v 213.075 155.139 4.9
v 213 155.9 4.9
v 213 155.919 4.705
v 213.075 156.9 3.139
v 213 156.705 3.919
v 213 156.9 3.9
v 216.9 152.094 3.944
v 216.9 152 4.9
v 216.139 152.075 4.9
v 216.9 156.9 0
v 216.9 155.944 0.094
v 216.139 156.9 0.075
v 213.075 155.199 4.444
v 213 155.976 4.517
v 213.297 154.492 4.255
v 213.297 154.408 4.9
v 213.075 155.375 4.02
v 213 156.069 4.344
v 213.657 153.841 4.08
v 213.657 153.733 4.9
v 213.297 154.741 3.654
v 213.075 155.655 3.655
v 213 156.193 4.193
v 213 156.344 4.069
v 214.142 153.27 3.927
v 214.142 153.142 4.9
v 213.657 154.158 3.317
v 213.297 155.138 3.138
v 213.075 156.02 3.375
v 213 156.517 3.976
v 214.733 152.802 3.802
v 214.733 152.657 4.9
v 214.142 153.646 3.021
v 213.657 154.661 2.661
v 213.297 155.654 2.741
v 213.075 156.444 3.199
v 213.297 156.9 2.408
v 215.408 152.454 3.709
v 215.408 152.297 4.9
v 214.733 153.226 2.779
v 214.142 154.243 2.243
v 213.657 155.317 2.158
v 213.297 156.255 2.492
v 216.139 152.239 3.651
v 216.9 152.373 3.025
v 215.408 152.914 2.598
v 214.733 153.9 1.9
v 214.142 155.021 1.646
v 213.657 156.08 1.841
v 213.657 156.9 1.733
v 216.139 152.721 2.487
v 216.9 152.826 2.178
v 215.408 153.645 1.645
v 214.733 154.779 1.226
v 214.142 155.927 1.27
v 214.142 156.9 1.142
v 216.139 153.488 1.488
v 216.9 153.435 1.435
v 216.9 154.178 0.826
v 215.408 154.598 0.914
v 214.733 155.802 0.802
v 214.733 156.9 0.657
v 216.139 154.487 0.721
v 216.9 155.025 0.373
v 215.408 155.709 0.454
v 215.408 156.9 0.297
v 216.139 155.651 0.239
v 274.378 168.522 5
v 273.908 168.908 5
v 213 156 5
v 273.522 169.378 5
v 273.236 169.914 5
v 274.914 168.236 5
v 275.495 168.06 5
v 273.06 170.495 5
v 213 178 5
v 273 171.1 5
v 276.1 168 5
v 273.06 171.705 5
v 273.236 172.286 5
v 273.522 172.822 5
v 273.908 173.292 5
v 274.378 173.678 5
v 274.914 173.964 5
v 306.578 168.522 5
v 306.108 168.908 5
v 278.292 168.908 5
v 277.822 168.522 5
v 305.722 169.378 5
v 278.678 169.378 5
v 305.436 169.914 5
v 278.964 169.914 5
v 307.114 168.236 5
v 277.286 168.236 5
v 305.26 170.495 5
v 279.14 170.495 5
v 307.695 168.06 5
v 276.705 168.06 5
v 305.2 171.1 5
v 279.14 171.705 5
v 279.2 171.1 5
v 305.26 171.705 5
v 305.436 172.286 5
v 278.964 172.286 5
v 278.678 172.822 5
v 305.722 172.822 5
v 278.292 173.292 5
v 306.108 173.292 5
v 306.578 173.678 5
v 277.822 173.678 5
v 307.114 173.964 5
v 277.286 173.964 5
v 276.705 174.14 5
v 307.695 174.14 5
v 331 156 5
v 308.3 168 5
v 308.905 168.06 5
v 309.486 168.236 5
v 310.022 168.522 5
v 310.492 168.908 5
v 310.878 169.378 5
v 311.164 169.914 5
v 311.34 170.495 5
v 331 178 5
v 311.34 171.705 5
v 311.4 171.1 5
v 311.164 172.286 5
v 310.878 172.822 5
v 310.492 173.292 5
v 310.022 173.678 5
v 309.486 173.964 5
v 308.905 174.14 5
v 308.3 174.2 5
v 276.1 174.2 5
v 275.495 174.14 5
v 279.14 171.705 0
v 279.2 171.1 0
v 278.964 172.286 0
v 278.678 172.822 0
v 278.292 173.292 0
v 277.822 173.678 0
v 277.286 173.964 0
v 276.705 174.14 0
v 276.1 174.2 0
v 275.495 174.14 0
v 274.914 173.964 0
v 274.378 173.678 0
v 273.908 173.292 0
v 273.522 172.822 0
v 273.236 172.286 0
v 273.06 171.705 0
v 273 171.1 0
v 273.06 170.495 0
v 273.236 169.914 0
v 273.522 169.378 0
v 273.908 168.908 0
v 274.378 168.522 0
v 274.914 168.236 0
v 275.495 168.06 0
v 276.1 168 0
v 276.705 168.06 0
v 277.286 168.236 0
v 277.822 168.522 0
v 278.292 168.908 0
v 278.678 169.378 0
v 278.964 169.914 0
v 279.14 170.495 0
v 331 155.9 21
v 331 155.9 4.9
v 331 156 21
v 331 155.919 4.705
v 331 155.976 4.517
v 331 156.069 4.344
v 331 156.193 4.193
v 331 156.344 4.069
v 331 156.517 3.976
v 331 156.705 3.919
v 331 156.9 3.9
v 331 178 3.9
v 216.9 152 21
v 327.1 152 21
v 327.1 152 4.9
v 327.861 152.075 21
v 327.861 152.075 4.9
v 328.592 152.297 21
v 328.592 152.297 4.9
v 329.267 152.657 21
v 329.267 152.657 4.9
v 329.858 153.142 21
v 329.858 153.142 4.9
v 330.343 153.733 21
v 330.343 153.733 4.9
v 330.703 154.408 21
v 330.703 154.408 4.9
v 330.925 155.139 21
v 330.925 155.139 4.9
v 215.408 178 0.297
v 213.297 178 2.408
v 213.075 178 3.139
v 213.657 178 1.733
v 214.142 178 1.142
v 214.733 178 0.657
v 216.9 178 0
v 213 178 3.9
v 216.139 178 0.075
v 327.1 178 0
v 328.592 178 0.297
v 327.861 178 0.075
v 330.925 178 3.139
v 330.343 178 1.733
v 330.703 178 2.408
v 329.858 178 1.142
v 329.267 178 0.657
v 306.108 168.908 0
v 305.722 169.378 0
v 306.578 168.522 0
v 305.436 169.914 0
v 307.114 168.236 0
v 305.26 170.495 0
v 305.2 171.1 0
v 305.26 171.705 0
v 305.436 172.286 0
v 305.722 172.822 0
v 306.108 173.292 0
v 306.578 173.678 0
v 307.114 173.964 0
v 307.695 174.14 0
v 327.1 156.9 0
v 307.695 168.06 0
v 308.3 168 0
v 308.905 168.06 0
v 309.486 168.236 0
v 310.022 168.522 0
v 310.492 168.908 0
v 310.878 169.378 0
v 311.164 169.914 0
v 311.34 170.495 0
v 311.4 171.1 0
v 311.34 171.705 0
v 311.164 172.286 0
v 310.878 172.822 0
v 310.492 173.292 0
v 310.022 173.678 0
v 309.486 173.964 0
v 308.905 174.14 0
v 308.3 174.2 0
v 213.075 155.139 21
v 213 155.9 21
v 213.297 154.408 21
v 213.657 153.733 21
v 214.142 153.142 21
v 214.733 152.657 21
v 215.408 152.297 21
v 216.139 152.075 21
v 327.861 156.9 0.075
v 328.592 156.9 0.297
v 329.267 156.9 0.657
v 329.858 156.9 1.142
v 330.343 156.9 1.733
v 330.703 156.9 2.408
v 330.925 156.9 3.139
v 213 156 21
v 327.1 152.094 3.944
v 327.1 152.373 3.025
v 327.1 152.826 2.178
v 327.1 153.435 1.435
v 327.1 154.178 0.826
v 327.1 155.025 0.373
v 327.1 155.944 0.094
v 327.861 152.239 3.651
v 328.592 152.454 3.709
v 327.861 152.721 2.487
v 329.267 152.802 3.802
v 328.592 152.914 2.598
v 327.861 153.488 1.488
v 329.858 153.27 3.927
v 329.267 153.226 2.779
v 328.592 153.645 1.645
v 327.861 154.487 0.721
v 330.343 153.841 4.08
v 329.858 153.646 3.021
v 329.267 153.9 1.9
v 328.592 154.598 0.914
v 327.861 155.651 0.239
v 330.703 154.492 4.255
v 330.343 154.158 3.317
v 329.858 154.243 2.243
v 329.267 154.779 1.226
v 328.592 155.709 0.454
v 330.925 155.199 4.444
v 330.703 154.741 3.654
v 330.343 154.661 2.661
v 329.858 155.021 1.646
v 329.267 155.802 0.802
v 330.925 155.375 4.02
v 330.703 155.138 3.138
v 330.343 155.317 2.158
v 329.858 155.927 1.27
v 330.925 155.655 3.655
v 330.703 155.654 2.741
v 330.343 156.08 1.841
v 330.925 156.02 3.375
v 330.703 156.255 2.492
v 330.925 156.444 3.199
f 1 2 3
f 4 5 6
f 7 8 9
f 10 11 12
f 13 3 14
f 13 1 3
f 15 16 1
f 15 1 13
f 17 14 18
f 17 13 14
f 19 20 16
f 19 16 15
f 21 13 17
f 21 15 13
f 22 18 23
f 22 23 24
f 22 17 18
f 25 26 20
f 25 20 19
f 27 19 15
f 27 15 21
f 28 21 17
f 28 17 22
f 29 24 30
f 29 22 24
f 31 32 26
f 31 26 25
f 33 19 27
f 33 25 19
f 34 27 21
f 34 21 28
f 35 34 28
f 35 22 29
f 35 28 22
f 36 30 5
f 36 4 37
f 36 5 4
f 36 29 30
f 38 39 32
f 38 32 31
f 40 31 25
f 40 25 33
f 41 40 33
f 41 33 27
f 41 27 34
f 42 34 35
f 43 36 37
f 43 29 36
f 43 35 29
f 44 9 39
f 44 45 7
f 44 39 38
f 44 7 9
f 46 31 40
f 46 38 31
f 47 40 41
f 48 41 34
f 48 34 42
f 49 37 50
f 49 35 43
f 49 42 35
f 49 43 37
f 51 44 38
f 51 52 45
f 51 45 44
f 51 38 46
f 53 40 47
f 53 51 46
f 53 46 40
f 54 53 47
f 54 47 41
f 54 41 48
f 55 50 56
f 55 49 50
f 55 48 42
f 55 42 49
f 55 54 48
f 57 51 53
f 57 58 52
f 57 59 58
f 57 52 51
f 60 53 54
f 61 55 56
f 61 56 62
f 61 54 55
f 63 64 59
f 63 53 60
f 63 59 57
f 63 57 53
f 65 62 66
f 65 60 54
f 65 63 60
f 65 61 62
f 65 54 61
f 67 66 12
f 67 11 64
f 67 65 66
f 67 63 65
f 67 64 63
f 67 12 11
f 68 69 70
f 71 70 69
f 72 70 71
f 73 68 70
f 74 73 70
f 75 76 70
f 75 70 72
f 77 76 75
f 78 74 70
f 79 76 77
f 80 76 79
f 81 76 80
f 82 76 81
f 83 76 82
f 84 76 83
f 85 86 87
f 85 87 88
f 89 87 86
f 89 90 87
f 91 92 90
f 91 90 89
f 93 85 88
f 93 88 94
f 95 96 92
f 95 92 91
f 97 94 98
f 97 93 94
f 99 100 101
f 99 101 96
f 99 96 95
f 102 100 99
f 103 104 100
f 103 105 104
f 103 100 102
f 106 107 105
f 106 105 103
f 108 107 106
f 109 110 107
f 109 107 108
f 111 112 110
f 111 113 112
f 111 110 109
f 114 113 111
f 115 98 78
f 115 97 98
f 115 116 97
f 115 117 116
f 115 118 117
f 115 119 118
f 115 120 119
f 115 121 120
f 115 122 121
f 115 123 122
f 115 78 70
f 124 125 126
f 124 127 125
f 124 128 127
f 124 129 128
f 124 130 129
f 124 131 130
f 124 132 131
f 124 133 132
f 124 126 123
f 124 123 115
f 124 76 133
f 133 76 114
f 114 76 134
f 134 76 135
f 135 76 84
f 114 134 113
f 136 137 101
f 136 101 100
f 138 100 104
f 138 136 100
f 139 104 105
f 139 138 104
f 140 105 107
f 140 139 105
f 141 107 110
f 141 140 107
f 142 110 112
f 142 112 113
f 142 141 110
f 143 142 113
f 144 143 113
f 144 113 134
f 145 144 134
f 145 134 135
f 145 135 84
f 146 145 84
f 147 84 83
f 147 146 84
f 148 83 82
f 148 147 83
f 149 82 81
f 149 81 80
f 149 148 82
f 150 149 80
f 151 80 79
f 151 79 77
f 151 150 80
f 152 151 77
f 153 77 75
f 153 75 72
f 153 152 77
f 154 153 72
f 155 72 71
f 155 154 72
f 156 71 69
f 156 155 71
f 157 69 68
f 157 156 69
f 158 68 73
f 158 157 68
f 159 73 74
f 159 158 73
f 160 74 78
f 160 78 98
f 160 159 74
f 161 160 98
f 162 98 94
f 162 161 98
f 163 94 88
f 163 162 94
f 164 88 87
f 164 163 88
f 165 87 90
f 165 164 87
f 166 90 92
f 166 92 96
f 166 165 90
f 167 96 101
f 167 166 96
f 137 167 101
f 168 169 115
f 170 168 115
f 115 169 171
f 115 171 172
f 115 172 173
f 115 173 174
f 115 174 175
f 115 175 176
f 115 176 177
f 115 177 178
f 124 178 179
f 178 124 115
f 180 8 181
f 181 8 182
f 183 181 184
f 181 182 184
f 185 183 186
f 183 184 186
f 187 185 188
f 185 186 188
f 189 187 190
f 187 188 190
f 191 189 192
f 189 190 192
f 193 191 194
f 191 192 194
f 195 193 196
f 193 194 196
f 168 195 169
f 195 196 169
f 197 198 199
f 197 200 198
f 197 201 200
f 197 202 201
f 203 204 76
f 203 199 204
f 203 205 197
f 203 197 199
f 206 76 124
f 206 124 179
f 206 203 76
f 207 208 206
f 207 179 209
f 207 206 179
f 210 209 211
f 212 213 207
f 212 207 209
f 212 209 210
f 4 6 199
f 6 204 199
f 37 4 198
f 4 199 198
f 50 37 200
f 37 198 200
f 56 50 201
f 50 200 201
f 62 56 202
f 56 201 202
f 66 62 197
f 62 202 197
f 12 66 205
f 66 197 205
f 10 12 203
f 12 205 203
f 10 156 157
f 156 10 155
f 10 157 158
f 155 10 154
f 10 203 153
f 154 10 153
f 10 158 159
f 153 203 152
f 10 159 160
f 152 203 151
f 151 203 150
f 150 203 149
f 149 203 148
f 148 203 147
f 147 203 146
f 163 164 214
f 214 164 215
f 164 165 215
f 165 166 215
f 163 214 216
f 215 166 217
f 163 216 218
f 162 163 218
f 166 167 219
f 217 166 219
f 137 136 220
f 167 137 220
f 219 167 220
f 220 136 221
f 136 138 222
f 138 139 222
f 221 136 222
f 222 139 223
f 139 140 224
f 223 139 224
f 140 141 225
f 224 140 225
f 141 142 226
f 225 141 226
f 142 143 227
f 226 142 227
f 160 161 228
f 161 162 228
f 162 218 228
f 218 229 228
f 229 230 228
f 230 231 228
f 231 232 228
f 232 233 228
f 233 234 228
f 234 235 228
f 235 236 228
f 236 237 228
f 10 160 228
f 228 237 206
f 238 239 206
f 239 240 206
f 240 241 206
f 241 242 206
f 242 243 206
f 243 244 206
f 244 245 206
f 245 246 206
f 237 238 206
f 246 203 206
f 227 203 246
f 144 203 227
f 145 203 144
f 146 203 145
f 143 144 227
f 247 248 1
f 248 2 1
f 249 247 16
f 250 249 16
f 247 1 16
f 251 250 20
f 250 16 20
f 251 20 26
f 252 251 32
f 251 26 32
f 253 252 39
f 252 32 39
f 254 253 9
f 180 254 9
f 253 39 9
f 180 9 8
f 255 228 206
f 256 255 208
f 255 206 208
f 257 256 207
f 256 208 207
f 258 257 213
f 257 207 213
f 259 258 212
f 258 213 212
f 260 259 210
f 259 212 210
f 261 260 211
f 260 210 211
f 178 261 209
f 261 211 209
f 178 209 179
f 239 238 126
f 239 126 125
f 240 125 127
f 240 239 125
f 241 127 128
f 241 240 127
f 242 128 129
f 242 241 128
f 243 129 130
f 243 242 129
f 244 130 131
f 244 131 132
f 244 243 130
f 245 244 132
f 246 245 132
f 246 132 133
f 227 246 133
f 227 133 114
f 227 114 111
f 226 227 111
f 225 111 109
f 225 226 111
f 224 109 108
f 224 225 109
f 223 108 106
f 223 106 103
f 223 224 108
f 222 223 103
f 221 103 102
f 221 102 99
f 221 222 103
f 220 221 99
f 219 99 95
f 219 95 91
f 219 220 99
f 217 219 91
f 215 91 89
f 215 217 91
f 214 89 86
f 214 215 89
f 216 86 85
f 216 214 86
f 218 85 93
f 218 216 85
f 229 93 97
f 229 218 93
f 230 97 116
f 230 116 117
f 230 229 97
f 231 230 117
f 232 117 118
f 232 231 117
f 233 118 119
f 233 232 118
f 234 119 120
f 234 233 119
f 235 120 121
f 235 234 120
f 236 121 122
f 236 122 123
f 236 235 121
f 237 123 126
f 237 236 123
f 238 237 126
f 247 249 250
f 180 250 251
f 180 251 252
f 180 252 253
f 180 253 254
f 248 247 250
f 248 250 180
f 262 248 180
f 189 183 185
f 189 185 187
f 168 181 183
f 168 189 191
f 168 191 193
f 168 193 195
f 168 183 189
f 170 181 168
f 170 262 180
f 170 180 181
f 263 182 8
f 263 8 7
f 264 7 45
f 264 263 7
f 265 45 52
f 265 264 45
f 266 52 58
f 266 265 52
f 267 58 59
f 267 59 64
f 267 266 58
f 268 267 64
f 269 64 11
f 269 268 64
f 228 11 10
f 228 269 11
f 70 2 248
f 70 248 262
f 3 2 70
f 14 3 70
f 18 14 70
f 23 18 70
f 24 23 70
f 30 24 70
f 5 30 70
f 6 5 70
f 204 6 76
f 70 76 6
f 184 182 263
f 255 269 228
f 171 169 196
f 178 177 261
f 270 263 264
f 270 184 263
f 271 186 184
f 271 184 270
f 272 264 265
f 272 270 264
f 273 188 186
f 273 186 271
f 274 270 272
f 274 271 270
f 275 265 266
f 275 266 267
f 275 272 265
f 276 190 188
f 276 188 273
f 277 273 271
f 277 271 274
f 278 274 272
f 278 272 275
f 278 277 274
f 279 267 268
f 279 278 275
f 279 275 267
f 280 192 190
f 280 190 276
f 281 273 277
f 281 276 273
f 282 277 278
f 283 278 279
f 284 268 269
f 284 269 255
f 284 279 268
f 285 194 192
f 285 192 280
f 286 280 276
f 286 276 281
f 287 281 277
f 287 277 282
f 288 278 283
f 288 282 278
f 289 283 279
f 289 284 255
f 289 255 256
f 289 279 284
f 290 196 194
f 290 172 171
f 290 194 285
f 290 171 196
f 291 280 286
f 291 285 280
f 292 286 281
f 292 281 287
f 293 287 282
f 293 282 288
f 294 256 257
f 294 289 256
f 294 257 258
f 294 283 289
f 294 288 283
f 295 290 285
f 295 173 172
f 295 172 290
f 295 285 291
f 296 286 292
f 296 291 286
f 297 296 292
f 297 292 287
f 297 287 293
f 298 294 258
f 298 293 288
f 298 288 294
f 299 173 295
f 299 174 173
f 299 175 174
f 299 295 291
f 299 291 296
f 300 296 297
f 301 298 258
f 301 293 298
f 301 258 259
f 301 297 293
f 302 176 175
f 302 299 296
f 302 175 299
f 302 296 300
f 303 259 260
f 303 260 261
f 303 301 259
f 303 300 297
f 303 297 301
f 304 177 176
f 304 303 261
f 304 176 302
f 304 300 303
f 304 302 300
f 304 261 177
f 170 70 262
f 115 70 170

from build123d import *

# Parameters (mm, degrees)
SKETCH010_W  = 118
SKETCH010_H  = 26
SKETCH010_R  = 3.1
PAD010_DEPTH = 5
SKETCH011_W  = 118
SKETCH011_H  = 4
PAD011_DEPTH = 16
FILLET005_R  = 4.9
FILLET006_R  = 3.9


with BuildPart() as part:
    # Sketch010 → Pad010 (new body)
    with BuildSketch(Plane.XY):
        with Locations((0, 5)):
            Rectangle(SKETCH010_W, SKETCH010_H)
        with Locations((4.1, 11.1)):
            Circle(SKETCH010_R, mode=Mode.SUBTRACT)
        with Locations((36.3, 11.1)):
            Circle(SKETCH010_R, mode=Mode.SUBTRACT)
    extrude(amount=PAD010_DEPTH)

    # Sketch011 (on Face8 of Pad010) → Pad011 (join)
    with BuildSketch(Plane.XY.offset(5)):
        with Locations((0, -6)):
            Rectangle(SKETCH011_W, SKETCH011_H)
    extrude(amount=PAD011_DEPTH)

    # Fillet005
    fillet005_edges = [part.edges().sort_by_distance(p)[0] for p in [
        (0, -8, 0),
    ]]
    fillet(fillet005_edges, radius=FILLET005_R)

    # Fillet006
    fillet006_edges = [part.edges().sort_by_distance(p)[0] for p in [
        (-59, -6.564823, 1.435177),
        (59, -6.564823, 1.435177),
    ]]
    fillet(fillet006_edges, radius=FILLET006_R)


with BuildPart() as part_1:
    # Body009 placement: moved
    add(part.part.moved(Location((272, 160, 0))))


solid = part_1.part
